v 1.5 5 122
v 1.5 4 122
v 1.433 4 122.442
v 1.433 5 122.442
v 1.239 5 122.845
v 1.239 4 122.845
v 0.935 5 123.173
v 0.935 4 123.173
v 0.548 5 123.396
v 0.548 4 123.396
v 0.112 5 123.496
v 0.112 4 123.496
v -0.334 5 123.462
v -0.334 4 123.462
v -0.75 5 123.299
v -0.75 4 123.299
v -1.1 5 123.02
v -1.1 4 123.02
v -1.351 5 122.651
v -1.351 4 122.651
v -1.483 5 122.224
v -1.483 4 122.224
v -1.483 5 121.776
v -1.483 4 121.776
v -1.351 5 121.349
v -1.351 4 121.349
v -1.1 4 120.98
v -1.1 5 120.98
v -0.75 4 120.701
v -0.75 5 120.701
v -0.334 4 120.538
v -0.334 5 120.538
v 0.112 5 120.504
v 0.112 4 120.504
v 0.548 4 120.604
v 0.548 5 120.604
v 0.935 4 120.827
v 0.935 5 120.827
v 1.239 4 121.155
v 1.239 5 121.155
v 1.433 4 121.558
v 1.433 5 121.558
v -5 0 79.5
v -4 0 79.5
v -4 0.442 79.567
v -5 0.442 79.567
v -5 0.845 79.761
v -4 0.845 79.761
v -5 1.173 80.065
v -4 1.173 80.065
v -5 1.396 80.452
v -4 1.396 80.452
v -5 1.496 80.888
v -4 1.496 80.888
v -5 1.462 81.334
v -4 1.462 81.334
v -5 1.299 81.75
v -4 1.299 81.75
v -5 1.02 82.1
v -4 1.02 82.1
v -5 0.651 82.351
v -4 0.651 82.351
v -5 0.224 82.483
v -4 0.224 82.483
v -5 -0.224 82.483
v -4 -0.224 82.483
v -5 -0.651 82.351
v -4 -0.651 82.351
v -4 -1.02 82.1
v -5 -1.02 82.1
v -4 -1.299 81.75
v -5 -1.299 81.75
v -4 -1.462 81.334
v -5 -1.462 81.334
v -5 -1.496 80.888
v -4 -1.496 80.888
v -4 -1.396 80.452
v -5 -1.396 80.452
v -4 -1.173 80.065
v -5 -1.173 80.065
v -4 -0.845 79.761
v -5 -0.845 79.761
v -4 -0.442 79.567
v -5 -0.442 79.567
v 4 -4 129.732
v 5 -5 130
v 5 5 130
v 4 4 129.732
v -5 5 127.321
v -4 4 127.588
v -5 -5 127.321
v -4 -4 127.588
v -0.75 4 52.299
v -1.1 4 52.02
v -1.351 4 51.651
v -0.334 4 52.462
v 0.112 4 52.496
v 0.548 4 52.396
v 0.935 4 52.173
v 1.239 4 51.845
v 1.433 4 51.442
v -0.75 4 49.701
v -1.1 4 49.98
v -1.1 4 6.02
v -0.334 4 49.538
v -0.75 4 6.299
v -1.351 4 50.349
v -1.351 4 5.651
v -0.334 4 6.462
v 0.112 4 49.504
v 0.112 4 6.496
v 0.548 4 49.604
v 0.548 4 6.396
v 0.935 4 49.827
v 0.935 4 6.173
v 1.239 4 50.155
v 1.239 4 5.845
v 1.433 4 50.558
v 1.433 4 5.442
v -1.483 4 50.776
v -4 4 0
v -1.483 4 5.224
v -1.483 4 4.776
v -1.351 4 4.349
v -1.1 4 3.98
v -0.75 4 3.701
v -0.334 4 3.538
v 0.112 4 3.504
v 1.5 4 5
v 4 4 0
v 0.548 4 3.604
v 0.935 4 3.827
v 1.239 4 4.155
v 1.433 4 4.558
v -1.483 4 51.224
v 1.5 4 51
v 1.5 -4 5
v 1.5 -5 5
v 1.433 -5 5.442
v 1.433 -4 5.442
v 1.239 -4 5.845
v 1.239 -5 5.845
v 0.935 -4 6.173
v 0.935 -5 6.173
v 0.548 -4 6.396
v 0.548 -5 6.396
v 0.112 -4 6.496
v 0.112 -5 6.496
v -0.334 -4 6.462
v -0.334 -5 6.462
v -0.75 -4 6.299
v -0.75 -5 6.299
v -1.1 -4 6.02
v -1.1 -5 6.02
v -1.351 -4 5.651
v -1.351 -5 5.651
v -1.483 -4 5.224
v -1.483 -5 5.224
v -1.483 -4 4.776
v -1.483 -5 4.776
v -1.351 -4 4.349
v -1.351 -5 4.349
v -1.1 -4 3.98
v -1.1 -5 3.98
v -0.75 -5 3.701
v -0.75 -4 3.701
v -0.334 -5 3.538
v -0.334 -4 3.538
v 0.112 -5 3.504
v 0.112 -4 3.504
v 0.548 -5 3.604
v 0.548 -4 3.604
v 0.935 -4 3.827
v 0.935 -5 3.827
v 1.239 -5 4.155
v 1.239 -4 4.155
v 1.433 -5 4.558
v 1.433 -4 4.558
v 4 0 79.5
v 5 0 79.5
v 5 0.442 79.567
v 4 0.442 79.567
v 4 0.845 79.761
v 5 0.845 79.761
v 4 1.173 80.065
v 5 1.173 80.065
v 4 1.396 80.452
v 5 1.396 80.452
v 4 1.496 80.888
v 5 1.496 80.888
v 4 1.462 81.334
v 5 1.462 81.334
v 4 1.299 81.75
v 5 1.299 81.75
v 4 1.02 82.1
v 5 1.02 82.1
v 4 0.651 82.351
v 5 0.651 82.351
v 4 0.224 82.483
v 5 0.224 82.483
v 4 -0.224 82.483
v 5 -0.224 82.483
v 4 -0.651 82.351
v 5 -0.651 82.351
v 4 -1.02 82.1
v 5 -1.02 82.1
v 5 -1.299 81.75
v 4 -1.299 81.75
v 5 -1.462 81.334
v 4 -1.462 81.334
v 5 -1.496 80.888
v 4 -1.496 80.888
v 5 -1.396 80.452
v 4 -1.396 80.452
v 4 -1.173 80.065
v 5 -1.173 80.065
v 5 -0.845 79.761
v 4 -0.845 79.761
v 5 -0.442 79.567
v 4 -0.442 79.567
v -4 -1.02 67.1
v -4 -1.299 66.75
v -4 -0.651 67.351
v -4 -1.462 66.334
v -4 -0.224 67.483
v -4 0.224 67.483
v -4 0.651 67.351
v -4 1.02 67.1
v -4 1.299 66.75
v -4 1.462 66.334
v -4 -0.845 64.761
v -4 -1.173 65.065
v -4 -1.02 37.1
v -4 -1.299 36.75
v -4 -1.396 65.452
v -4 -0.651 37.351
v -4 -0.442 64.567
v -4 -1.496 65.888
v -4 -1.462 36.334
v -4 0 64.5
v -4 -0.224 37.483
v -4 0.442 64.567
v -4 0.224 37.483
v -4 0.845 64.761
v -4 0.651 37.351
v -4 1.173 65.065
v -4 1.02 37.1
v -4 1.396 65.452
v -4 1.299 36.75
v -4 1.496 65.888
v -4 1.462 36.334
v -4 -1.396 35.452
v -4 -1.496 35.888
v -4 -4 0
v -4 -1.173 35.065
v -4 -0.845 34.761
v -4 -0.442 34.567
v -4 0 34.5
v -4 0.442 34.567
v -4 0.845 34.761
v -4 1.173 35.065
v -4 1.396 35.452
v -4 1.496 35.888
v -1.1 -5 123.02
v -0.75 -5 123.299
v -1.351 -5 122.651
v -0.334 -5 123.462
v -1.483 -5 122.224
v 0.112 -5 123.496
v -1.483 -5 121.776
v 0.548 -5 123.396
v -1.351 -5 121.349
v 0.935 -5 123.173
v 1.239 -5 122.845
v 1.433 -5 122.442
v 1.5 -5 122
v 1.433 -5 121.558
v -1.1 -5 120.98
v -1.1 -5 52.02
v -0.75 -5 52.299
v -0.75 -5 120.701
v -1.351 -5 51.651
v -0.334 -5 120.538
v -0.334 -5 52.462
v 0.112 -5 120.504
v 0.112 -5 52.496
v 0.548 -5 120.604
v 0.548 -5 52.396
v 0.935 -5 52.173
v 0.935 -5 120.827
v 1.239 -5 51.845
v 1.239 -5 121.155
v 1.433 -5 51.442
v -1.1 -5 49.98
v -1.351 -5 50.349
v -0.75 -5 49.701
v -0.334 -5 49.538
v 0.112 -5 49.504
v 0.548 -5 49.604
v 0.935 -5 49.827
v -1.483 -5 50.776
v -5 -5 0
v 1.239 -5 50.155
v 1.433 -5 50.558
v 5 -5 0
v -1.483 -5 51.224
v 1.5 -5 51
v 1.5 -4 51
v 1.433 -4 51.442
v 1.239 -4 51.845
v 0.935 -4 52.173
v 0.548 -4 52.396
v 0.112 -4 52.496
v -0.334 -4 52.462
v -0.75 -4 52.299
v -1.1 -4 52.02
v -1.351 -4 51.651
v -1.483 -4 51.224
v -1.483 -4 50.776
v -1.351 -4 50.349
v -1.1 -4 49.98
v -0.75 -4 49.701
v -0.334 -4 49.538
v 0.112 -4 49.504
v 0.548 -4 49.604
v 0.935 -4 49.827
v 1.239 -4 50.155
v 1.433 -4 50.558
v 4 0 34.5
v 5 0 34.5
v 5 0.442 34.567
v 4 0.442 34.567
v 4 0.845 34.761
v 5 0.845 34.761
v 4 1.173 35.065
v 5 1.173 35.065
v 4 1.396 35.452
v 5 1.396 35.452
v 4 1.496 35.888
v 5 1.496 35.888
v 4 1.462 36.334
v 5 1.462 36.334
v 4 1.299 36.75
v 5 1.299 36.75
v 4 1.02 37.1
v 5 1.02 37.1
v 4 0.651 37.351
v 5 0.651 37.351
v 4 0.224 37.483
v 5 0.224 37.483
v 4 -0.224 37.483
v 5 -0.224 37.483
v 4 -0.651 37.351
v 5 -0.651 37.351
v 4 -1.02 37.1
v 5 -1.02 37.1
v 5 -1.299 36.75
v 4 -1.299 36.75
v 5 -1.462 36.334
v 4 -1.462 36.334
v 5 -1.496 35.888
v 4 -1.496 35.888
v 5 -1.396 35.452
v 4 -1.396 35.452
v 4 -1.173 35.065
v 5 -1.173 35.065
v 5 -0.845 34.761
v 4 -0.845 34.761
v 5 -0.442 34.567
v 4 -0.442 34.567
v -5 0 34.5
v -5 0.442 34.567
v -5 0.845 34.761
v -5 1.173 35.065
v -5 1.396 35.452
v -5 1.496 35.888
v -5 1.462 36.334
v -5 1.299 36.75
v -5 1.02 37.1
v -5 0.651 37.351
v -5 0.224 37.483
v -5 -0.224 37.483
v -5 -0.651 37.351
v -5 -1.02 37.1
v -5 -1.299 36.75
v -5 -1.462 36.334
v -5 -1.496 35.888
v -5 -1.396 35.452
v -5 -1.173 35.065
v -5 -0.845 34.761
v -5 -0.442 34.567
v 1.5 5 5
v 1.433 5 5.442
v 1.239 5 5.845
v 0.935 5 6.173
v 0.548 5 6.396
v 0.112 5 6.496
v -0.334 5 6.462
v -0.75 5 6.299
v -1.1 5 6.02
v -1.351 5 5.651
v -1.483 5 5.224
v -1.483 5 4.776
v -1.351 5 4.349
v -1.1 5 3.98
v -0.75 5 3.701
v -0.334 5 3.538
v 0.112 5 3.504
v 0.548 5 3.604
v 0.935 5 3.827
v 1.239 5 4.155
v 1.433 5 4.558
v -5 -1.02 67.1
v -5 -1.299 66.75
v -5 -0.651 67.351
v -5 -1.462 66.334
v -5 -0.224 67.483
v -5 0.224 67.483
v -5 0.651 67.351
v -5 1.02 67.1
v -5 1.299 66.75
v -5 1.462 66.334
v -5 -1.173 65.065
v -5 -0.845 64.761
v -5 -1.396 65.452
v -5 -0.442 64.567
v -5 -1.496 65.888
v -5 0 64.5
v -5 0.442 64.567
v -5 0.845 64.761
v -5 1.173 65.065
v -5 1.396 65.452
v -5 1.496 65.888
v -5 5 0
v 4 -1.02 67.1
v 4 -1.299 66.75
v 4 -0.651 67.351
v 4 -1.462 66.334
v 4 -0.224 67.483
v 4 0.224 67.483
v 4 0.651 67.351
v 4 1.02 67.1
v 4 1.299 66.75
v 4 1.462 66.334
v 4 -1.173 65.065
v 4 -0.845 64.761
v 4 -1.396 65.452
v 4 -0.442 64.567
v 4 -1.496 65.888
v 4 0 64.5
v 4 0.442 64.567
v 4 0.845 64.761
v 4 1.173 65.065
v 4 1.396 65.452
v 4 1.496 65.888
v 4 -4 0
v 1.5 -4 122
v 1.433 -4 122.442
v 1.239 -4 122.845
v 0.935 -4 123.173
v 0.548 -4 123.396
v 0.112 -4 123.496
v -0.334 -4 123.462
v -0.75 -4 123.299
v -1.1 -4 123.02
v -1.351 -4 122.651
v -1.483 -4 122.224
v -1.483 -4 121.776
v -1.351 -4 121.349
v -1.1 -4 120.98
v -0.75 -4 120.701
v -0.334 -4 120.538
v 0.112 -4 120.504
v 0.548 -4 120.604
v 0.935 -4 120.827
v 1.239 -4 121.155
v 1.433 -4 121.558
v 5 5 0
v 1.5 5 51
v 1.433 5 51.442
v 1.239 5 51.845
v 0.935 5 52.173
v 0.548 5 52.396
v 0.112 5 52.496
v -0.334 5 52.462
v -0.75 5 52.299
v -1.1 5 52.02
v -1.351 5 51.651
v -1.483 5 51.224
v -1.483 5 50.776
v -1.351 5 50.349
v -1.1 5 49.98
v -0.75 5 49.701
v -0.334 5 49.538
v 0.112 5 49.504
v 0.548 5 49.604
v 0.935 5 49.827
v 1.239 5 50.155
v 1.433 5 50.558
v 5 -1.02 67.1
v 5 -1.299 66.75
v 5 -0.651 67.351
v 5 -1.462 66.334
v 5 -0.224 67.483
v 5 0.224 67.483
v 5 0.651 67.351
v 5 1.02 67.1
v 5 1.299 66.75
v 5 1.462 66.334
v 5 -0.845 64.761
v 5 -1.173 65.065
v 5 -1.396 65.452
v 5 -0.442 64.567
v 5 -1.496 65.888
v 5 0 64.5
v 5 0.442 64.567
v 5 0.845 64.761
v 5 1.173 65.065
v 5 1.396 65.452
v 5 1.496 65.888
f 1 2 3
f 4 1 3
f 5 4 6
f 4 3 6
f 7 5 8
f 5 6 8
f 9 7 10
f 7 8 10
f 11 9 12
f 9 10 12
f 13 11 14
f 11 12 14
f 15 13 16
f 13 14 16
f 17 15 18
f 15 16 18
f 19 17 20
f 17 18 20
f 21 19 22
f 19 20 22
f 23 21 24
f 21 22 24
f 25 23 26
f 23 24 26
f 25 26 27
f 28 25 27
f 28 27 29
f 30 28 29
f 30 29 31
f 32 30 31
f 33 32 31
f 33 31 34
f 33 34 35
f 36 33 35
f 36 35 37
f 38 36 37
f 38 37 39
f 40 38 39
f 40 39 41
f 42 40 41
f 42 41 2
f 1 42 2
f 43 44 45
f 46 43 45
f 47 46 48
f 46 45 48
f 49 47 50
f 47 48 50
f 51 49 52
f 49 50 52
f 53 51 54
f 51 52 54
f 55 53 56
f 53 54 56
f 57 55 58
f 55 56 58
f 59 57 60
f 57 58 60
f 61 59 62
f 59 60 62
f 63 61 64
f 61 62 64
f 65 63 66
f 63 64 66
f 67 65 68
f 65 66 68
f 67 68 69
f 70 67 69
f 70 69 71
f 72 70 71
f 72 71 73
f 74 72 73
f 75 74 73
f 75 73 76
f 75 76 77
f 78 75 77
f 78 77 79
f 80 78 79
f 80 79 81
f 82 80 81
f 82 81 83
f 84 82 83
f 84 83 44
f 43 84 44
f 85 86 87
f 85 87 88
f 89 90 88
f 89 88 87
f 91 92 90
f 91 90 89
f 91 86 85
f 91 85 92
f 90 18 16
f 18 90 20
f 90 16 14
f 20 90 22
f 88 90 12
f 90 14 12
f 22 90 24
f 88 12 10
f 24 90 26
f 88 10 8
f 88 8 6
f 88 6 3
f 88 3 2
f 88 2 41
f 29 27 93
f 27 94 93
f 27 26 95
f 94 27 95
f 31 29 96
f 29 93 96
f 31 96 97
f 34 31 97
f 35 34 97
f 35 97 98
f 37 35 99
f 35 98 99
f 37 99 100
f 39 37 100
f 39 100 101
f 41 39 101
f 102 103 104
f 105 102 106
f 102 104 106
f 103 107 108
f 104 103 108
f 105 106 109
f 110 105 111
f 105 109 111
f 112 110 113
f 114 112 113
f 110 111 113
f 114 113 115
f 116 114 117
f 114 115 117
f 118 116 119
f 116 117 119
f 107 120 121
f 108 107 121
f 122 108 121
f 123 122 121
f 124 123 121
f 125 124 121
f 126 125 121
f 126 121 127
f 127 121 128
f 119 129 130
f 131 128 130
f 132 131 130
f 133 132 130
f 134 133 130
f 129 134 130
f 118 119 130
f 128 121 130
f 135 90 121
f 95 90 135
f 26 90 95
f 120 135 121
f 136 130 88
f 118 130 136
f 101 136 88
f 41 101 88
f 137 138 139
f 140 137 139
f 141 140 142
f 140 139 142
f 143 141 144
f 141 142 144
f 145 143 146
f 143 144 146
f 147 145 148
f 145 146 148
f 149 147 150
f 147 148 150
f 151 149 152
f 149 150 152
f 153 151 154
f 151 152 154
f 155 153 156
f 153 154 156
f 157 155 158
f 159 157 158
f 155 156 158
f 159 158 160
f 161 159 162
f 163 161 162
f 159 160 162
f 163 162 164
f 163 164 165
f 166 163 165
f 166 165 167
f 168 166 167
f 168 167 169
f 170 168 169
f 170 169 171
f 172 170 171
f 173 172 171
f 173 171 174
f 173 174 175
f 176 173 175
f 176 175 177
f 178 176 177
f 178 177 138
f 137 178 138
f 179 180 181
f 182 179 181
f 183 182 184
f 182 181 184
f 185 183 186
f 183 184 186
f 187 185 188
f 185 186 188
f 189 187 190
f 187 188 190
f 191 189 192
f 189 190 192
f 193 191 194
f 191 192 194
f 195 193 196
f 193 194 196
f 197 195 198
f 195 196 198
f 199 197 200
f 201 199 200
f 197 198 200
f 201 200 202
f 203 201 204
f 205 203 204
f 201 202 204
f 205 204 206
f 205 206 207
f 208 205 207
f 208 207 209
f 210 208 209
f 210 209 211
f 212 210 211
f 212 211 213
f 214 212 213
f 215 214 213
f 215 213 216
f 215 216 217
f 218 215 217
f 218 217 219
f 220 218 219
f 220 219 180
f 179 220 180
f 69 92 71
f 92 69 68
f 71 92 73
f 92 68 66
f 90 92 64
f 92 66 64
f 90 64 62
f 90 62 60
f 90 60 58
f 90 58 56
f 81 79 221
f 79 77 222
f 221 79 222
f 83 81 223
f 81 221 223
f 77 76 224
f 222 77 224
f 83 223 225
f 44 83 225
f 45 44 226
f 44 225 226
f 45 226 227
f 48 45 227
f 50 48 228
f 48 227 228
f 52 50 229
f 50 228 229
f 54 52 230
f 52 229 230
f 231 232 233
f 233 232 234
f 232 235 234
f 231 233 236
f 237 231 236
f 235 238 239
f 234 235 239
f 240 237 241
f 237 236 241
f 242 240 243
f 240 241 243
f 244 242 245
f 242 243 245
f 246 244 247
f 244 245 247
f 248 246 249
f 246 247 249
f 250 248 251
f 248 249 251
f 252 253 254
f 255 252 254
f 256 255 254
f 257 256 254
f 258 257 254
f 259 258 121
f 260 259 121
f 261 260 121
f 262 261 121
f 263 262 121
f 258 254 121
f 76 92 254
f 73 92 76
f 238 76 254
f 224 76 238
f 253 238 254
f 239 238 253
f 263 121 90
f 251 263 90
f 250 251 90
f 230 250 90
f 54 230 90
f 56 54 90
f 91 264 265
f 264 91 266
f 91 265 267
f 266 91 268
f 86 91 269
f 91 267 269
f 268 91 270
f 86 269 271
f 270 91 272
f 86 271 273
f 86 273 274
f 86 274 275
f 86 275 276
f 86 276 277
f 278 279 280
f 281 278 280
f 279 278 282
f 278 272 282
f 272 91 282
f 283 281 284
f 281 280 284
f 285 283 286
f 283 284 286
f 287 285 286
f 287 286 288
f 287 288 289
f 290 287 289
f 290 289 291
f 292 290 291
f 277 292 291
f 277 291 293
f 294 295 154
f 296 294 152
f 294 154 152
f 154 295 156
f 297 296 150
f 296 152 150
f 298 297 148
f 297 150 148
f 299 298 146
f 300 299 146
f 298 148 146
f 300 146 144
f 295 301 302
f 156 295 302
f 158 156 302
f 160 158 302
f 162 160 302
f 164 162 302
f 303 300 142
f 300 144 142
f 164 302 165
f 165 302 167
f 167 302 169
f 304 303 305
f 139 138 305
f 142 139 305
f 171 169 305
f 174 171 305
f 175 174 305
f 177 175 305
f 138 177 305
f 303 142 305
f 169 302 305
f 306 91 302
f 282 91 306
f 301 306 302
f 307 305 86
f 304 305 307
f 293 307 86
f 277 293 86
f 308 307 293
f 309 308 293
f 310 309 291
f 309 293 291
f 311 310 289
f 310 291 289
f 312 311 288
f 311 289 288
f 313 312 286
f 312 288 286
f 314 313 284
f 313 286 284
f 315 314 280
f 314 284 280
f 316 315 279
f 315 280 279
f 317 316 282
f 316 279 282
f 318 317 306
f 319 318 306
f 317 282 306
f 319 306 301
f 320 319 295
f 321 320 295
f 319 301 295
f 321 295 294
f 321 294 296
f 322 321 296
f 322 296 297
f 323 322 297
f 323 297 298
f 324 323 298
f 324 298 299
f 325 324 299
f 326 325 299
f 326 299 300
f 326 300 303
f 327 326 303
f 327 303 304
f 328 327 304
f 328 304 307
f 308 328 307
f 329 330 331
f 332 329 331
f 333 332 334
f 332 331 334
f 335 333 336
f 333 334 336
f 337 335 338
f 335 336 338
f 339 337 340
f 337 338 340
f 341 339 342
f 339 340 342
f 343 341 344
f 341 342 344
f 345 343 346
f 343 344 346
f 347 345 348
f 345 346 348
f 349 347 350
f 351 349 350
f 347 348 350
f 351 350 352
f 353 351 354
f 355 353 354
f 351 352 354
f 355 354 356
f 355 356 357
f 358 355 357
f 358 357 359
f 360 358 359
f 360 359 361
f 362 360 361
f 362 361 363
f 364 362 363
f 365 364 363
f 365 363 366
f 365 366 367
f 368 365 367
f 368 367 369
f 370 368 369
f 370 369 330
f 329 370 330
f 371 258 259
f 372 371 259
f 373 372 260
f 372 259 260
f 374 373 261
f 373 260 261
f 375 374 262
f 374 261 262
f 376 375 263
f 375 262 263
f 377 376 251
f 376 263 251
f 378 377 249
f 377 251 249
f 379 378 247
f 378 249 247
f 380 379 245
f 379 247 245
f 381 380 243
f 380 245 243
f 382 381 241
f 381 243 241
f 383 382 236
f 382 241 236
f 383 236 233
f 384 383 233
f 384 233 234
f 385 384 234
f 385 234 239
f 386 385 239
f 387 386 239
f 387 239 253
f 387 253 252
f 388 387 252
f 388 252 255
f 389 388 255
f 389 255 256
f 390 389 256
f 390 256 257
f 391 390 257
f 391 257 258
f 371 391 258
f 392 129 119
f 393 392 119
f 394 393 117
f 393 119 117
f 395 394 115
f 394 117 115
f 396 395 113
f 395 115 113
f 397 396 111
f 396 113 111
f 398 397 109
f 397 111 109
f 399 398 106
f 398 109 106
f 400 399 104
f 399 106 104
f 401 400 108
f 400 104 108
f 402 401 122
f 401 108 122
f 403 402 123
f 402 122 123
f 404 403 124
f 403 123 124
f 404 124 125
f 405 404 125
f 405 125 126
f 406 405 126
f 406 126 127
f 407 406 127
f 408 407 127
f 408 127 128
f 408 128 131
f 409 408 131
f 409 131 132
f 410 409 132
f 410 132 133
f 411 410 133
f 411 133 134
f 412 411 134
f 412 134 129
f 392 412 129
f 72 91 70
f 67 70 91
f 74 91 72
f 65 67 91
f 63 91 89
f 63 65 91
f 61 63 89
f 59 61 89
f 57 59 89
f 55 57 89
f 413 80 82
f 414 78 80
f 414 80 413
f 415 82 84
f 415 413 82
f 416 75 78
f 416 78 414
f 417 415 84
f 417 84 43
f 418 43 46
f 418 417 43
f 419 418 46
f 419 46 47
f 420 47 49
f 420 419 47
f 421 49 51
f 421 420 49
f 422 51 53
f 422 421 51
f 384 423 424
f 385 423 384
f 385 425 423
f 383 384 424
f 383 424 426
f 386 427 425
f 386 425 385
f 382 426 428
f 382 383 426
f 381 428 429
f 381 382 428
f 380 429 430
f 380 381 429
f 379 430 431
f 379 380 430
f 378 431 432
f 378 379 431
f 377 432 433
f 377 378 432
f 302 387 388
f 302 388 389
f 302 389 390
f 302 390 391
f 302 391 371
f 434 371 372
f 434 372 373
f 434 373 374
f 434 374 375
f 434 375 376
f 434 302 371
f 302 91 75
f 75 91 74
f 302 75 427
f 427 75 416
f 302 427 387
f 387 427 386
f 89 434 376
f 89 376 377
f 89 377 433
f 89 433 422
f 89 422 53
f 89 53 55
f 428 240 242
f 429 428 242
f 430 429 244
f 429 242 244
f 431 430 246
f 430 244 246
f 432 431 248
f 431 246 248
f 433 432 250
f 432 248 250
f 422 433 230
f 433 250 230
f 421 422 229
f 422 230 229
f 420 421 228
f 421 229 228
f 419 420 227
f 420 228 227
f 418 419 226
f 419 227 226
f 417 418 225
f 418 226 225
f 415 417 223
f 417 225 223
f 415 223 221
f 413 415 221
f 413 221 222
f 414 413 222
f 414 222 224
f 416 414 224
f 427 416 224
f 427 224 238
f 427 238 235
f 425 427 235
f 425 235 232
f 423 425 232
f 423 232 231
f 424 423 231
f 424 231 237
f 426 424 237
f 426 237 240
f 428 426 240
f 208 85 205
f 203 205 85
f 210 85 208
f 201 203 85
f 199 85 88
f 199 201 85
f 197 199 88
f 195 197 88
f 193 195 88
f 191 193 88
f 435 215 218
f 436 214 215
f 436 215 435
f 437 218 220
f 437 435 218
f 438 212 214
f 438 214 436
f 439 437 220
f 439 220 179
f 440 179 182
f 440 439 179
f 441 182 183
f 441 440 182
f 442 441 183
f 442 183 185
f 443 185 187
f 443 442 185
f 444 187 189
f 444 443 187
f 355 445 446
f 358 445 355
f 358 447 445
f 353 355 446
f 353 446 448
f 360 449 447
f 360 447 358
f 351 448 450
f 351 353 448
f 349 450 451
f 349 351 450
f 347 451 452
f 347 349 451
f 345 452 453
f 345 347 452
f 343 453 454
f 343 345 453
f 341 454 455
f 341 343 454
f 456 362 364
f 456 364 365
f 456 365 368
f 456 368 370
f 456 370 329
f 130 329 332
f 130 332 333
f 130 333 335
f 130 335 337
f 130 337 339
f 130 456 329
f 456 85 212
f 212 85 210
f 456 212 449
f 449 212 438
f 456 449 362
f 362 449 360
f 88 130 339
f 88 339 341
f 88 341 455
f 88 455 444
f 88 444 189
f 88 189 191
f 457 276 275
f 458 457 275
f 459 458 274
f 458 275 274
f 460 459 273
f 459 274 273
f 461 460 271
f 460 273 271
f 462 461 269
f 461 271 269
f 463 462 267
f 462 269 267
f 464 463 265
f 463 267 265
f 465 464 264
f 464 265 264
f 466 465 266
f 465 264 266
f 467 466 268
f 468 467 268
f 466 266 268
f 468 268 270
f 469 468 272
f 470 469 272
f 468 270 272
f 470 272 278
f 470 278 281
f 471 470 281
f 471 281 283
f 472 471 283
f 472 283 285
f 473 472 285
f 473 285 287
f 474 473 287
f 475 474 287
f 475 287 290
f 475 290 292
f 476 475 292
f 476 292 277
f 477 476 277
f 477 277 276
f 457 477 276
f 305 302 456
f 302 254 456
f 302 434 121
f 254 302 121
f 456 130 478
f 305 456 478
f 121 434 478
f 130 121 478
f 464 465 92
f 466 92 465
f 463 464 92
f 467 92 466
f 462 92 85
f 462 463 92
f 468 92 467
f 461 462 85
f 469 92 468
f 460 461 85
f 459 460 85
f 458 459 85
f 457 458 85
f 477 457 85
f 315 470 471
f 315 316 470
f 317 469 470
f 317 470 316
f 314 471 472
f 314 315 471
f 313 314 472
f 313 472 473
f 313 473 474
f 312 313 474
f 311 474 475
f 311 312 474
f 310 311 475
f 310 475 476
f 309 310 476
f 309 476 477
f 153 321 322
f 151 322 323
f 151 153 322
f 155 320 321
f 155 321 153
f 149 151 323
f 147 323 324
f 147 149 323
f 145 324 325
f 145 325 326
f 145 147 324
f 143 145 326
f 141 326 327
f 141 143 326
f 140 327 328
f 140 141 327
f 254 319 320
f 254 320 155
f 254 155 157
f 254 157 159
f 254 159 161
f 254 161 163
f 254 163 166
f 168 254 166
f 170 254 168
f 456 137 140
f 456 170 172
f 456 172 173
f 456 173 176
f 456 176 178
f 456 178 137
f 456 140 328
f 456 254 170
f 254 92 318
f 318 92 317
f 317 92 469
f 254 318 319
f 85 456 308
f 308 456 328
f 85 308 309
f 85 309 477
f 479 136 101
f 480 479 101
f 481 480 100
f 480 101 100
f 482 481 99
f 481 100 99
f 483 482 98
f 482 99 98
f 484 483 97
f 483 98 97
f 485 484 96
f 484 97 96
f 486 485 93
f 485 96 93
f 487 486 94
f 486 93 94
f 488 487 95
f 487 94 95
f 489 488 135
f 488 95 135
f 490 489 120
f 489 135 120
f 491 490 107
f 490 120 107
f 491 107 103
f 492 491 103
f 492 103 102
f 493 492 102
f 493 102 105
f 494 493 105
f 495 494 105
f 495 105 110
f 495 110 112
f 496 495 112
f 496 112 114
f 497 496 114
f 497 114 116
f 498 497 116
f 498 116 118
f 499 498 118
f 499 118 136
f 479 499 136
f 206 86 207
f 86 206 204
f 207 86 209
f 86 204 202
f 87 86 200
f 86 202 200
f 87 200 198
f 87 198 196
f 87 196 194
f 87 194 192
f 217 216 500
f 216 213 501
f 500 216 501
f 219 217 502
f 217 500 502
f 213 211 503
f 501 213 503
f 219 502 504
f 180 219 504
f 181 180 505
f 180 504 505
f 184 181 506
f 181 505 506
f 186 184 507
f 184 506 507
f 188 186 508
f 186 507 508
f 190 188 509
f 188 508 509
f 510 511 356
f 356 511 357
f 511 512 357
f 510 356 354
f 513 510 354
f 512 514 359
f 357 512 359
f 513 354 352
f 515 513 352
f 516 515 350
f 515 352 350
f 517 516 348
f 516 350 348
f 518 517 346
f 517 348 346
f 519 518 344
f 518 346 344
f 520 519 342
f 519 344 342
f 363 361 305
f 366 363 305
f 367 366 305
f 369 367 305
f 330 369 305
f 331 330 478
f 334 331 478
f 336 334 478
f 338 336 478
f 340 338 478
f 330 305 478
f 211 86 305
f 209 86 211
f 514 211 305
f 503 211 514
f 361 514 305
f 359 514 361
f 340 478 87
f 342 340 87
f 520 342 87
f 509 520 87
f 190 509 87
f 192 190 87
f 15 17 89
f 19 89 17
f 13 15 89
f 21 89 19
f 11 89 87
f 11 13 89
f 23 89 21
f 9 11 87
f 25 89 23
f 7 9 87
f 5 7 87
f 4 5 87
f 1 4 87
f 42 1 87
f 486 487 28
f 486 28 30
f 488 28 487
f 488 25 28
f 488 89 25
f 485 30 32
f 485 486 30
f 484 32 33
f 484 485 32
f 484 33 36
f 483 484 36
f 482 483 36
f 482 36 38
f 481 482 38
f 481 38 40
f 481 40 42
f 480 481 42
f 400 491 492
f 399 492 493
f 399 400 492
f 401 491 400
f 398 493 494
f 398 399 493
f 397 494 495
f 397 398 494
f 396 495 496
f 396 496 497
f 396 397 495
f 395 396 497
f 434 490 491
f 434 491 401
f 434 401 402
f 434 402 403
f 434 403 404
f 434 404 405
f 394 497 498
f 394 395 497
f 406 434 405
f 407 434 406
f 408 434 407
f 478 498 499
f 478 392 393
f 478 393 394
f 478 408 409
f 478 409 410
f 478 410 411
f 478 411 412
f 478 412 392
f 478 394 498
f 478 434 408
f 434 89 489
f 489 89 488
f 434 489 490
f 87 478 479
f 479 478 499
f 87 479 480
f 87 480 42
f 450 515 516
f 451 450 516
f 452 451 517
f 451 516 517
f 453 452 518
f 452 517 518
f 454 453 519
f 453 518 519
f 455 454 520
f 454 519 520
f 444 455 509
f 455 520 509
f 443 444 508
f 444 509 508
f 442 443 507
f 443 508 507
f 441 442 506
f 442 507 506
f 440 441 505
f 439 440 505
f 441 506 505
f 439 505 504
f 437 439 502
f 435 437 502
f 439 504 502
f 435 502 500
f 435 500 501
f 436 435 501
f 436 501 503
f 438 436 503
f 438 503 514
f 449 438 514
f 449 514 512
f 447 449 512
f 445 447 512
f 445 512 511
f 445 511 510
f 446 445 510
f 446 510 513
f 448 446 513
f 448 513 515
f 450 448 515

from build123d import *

# Parameters (mm, degrees)
SKETCH_1_W          = 10
SKETCH_1_H          = 10
SKETCH_1_W_2        = 8
SKETCH_1_H_2        = 8
EXTRUDE_1_DEPTH     = 130
SKETCH_2_R          = 1.5
CUT_EXTRUDE_1_DEPTH = 11
SKETCH_3_R          = 1.5
CUT_EXTRUDE_2_DEPTH = 11


with BuildPart() as part:
    # 草图1 → 拉伸-薄壁1 (new body)
    with BuildSketch(Plane.XY):
        Rectangle(SKETCH_1_W, SKETCH_1_H)
        Rectangle(SKETCH_1_W_2, SKETCH_1_H_2, mode=Mode.SUBTRACT)
    extrude(amount=EXTRUDE_1_DEPTH)

    # 草图2 → 切除-拉伸1 (cut, through all)
    with BuildSketch(Plane.XZ.offset(5)):
        with Locations((0, 51)):
            Circle(SKETCH_2_R)
        with Locations((0, 122)):
            Circle(SKETCH_2_R)
        with Locations((0, 5)):
            Circle(SKETCH_2_R)
        Polygon((5, 130), (-5, 127.320508076), (-5, 130), align=None)
    extrude(amount=-CUT_EXTRUDE_1_DEPTH, mode=Mode.SUBTRACT)

    # 草图3 → 切除-拉伸2 (cut, through all)
    with BuildSketch(Plane(origin=(5, 0, 0), x_dir=(0, 0, -1), z_dir=(1, 0, 0))):
        with Locations((-36, 0)):
            Circle(SKETCH_3_R)
        with Locations((-66, 0)):
            Circle(SKETCH_3_R)
        with Locations((-81, 0)):
            Circle(SKETCH_3_R)
    extrude(amount=-CUT_EXTRUDE_2_DEPTH, mode=Mode.SUBTRACT)


solid = part.part
